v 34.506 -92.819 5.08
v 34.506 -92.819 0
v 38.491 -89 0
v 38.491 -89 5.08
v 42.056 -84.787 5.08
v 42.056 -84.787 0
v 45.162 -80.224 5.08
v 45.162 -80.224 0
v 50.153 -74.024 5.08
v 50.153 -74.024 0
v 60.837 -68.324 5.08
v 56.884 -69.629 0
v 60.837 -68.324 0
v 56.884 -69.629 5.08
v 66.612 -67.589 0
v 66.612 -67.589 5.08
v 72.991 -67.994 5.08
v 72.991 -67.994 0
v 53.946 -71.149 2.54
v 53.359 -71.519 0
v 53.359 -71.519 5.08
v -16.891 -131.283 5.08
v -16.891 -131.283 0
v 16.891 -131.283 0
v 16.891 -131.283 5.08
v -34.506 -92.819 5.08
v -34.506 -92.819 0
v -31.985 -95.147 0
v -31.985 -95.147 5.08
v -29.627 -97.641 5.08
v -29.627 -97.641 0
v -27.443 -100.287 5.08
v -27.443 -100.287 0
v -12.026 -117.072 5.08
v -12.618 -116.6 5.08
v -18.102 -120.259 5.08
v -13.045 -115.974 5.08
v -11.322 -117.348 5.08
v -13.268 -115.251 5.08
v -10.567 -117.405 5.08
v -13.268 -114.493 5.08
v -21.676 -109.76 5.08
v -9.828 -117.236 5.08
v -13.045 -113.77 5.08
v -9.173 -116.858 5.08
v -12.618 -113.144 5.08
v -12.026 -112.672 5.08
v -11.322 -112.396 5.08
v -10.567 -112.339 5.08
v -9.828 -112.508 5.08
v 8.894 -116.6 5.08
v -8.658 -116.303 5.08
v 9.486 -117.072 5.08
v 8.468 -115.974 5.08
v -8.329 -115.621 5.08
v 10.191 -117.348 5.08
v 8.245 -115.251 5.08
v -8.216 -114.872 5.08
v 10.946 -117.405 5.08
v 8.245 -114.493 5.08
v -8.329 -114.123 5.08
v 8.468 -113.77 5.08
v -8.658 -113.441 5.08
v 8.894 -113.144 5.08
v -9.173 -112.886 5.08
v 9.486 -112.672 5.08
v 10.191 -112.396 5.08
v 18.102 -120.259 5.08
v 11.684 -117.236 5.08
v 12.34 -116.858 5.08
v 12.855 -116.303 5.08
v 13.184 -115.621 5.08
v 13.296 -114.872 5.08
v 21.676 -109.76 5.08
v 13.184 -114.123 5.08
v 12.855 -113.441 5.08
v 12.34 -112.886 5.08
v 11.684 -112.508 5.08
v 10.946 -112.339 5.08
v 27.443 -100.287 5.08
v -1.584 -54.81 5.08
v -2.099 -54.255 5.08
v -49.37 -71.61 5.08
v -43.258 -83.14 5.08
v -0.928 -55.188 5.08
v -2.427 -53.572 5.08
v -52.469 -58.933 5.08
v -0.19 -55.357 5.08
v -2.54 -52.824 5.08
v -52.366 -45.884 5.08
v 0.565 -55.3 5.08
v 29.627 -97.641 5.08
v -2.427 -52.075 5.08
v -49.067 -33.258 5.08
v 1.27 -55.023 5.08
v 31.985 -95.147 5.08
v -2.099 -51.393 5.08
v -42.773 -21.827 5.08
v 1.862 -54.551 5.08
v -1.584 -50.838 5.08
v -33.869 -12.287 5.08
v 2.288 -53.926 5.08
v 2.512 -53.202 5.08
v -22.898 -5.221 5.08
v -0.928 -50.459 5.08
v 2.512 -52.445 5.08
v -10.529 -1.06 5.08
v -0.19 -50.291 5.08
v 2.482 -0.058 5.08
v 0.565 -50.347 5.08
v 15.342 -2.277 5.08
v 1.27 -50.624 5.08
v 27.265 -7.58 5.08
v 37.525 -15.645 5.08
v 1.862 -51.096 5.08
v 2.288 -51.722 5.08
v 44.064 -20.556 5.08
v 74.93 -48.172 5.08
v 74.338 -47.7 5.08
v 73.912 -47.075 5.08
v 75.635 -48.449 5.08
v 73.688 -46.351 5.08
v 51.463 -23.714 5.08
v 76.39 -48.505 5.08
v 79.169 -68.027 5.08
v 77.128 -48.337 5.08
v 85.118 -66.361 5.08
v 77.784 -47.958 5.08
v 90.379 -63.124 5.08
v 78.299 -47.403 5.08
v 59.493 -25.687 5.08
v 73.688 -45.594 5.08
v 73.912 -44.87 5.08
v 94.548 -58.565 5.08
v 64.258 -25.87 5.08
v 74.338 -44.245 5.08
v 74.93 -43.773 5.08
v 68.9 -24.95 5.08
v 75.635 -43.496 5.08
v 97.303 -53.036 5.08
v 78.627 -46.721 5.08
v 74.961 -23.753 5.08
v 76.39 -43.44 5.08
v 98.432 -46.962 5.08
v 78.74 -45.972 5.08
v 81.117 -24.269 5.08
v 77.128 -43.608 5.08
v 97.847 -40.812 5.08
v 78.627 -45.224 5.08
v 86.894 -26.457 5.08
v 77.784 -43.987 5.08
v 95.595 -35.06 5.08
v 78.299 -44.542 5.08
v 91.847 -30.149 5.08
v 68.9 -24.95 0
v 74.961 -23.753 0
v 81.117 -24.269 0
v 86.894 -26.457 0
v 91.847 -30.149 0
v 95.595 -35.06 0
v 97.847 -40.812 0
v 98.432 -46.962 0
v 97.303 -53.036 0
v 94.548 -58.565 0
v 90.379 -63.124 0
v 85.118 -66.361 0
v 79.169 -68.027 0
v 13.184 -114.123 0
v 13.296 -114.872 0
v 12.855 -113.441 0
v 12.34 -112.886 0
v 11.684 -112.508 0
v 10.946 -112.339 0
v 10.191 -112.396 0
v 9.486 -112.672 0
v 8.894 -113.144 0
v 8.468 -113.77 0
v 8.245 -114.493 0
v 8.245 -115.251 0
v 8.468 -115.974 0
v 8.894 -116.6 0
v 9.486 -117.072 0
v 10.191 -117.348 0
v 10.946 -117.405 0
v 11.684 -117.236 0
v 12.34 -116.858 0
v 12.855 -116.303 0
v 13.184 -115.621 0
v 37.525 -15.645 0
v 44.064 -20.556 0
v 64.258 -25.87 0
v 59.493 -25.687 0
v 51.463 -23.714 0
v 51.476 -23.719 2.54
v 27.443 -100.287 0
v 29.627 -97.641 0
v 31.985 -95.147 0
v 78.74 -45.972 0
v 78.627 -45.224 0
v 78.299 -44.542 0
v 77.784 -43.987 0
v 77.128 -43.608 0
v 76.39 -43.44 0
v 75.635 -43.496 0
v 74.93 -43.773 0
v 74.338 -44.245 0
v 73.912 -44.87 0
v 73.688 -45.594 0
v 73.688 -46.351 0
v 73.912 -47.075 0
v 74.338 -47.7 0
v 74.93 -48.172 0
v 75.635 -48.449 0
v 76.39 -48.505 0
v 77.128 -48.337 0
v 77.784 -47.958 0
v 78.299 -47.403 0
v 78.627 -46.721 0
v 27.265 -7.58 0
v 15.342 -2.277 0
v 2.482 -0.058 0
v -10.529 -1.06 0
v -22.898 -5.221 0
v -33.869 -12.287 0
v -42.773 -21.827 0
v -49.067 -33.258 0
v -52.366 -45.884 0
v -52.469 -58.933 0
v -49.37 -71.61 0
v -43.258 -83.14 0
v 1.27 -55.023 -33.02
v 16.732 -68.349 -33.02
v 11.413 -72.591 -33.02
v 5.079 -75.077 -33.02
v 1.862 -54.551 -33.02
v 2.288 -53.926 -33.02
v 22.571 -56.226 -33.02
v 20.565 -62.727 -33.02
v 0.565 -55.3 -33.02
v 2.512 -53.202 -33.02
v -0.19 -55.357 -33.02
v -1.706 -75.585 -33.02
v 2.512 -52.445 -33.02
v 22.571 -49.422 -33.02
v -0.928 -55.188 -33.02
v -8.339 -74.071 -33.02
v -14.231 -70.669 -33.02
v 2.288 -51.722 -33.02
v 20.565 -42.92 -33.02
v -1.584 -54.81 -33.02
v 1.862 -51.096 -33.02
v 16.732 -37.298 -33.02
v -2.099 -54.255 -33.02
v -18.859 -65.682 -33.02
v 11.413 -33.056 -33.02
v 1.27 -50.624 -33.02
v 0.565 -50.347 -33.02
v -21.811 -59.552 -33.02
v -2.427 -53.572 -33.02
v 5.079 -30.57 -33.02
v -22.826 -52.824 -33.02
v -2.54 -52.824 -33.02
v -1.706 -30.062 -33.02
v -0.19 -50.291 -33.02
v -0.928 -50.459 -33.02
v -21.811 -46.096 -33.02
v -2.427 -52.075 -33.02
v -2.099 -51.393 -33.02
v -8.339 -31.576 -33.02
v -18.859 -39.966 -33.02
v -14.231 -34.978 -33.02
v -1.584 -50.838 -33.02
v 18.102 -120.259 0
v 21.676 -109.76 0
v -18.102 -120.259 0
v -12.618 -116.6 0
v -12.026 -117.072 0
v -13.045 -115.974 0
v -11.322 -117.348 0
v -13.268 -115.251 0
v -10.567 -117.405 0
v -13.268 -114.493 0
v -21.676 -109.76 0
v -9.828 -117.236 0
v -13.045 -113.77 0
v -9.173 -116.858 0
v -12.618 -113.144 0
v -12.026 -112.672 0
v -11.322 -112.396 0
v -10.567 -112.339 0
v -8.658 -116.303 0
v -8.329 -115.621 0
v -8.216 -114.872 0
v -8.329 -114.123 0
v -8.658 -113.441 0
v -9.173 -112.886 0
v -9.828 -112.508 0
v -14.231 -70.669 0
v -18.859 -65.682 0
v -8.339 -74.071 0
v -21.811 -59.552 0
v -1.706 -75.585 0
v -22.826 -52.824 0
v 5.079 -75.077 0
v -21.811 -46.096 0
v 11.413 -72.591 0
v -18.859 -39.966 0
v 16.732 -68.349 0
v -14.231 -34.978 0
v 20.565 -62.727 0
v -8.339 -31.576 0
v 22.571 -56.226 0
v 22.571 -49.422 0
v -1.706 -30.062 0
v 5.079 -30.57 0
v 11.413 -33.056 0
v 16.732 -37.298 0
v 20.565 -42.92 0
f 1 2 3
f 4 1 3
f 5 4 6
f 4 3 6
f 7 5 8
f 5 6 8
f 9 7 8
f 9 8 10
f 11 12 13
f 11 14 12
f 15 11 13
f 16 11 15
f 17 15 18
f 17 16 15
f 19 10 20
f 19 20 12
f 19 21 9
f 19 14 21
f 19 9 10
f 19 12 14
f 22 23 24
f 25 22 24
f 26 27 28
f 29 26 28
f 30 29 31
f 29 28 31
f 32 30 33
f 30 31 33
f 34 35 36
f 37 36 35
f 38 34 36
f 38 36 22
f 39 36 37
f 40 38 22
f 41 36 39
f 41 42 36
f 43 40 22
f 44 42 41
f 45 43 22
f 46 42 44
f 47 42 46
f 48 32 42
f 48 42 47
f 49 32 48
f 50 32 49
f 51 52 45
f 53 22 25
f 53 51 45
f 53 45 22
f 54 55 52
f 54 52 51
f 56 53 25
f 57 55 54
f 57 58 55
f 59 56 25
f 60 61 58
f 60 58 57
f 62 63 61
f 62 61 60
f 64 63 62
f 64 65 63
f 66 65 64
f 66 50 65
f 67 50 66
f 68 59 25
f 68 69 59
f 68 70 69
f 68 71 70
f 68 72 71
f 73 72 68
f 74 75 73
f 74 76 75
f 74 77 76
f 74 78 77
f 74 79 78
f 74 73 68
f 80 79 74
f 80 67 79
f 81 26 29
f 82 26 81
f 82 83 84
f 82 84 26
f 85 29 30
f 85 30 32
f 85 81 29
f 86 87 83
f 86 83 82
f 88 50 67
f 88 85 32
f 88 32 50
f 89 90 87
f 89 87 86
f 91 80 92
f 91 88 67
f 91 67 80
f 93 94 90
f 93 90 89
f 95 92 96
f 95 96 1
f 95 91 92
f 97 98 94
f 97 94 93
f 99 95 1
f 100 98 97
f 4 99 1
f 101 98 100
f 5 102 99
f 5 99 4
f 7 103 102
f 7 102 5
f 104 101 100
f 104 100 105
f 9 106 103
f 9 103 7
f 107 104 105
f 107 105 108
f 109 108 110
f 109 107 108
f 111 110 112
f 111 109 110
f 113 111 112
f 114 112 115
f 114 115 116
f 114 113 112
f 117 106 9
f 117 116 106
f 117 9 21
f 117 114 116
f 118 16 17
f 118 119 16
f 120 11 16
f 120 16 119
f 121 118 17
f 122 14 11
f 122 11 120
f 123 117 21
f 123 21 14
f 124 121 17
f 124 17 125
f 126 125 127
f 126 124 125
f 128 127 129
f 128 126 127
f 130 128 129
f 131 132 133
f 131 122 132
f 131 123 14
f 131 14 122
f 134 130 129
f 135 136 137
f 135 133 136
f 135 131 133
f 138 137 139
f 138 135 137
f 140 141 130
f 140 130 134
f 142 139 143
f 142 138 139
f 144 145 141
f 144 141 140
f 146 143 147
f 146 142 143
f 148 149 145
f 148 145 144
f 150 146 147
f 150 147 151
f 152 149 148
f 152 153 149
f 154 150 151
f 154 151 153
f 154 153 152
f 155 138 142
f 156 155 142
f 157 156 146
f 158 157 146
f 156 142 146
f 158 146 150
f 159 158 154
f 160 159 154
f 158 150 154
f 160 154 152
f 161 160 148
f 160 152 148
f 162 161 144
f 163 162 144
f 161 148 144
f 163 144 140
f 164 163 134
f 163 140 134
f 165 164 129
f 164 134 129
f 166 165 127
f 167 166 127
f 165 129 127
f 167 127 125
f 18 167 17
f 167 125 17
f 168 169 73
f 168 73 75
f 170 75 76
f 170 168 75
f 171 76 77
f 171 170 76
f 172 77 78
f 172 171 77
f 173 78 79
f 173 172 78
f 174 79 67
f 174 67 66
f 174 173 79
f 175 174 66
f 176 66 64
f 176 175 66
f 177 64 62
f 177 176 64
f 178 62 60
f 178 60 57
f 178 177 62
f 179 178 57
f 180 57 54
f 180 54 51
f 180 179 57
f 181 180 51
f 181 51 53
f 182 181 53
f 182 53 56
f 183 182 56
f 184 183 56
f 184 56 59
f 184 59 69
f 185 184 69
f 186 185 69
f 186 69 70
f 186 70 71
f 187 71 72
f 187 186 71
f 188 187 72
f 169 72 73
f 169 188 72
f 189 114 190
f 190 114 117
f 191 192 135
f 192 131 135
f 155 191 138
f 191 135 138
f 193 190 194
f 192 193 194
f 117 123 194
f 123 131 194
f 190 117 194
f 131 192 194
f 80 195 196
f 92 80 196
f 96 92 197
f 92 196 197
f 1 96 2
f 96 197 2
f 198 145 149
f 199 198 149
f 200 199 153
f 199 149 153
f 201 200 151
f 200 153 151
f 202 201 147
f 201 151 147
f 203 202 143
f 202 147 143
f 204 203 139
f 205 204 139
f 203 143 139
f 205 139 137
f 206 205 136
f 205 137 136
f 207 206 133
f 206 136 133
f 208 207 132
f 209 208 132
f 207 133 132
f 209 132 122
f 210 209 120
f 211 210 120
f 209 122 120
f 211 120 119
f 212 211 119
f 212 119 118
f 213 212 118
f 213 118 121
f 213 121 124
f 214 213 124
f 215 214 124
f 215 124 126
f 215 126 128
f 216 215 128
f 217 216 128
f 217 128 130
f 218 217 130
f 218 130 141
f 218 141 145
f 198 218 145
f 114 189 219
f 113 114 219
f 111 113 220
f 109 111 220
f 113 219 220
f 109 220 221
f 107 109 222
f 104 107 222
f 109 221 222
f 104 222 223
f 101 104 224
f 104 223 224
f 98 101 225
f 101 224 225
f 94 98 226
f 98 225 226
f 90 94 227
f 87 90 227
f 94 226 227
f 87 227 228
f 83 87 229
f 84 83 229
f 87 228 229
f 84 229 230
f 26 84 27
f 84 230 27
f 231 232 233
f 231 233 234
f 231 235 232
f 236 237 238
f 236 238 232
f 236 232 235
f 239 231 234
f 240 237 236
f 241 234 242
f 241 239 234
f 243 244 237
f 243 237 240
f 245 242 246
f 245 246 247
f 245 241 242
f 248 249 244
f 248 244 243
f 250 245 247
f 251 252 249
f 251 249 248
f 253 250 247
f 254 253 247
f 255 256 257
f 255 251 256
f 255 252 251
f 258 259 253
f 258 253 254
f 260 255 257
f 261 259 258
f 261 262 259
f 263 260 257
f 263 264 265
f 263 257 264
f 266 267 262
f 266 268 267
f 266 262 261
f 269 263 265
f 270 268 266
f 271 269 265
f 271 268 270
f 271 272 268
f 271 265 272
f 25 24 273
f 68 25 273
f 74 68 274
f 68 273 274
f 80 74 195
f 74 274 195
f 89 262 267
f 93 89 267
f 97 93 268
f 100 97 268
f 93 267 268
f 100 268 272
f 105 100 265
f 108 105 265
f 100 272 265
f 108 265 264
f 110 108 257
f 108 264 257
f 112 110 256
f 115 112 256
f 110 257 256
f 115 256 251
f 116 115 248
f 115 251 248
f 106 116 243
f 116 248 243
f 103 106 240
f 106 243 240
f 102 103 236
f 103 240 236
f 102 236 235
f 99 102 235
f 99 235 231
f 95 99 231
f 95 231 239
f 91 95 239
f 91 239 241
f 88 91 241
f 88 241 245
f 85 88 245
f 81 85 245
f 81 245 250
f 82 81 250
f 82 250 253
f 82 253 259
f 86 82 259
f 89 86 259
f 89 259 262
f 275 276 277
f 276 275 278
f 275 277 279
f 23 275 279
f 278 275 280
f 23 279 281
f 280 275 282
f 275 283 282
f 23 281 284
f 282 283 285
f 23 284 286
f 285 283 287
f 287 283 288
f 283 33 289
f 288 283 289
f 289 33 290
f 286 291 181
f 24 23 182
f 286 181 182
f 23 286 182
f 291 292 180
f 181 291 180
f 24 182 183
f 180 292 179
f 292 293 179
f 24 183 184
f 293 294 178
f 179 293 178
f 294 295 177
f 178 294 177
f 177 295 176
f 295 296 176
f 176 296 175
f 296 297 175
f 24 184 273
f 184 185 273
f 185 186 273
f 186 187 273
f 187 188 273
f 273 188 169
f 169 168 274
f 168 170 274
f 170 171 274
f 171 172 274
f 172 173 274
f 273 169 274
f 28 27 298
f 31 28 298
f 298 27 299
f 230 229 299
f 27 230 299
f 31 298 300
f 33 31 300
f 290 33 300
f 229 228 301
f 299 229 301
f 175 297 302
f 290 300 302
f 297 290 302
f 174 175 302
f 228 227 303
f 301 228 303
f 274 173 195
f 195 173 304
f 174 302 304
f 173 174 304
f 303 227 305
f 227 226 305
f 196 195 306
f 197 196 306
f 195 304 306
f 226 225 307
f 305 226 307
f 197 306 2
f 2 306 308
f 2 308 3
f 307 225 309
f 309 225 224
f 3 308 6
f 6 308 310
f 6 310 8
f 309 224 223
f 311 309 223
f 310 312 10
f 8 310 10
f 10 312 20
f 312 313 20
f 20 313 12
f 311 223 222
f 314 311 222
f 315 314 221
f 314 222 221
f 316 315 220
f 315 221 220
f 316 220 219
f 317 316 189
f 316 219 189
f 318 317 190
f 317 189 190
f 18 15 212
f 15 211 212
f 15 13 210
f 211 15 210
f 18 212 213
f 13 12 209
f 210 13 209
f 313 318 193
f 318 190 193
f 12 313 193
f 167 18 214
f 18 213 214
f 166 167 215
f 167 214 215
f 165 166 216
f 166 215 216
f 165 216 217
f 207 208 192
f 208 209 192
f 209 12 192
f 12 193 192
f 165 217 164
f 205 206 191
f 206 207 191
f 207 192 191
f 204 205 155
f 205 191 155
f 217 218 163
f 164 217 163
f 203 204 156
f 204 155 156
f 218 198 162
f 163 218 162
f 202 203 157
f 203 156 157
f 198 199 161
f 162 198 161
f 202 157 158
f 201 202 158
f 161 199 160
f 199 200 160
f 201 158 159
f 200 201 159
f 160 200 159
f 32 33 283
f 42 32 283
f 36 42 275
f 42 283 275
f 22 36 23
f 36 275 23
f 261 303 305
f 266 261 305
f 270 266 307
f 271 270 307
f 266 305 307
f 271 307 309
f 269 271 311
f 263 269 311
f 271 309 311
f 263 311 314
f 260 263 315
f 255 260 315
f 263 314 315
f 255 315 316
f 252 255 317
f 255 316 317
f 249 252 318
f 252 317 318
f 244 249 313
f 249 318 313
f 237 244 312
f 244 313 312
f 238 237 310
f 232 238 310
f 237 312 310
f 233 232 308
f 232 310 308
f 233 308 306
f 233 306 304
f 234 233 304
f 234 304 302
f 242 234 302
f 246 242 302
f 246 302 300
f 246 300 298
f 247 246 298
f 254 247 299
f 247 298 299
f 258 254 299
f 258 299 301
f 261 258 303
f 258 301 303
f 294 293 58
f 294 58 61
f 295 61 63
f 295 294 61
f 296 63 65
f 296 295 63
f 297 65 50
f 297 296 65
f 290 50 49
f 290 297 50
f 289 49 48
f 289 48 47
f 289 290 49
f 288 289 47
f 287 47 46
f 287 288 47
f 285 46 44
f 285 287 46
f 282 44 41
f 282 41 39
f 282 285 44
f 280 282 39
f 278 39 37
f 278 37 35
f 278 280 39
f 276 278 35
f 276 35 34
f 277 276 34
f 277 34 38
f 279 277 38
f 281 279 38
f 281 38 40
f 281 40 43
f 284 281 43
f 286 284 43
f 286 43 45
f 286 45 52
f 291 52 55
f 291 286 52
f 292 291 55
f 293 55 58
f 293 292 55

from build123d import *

# Parameters (mm, degrees)
SKETCH1_R           = 2.54
BOSS_EXTRUDE1_DEPTH = 5.08
SKETCH2_R           = 22.825529453
BOSS_EXTRUDE2_DEPTH = 33.02
SKETCH3_R           = 2.54
CUT_EXTRUDE1_DEPTH  = 39.1
BOSS_EXTRUDE3_DEPTH = 5.08
SKETCH5_R           = 2.54
CUT_EXTRUDE2_DEPTH  = 39.1


with BuildPart() as part:
    # Sketch1 → Boss-Extrude1 (new body)
    with BuildSketch(Plane.XY):
        with BuildLine():
            Line((-16.891, -131.282672274), (16.891, -131.282672274))
            ThreePointArc((16.891, -131.282672274), (19.601252021, -114.911473805), (27.442816508, -100.287128633))
            ThreePointArc((27.442816508, -100.287128633), (30.785280347, -96.37410804), (34.5064888, -92.819336271))
            ThreePointArc((34.5064888, -92.819336271), (0, 0), (-34.5064888, -92.819336271))
            ThreePointArc((-34.5064888, -92.819336271), (-30.785280347, -96.37410804), (-27.442816508, -100.287128633))
            ThreePointArc((-27.442816508, -100.287128633), (-19.601252021, -114.911473805), (-16.891, -131.282672274))
        make_face()
        with Locations((-10.756405179, -114.872047193)):
            Circle(SKETCH1_R, mode=Mode.SUBTRACT)
        with Locations((10.756405179, -114.872047193)):
            Circle(SKETCH1_R, mode=Mode.SUBTRACT)
    extrude(amount=BOSS_EXTRUDE1_DEPTH)

    # Sketch2 → Boss-Extrude2 (add)
    with BuildSketch(Plane(origin=(0, 0, 0), x_dir=(-1, 0, 0), z_dir=(0, 0, -1))):
        with Locations((0, -52.823729134)):
            Circle(SKETCH2_R)
    extrude(amount=BOSS_EXTRUDE2_DEPTH)

    # Sketch3 → Cut-Extrude1 (cut, through all)
    with BuildSketch(Plane(origin=(0, 0, -33.02), x_dir=(-1, 0, 0), z_dir=(0, 0, -1))):
        with Locations((0, -52.823729134)):
            Circle(SKETCH3_R)
    extrude(amount=-CUT_EXTRUDE1_DEPTH, mode=Mode.SUBTRACT)

    # Sketch4 → Boss-Extrude3 (add)
    with BuildSketch(Plane.XY.offset(5.08)):
        with BuildLine():
            ThreePointArc((45.161811227, -80.223677424), (52.45816234, -46.619894549), (37.524583334, -15.645079276))
            add(Edge.make_bspline(
                [(37.524583334, -15.645079276), (41.569282444, -19.727412804), (51.389708048, -24.415182371), (63.297197231, -26.895437115), (68.900180003, -24.949874899)],
                knots=[0, 0, 0, 0, 0.479929933, 1, 1, 1, 1], degree=3))
            ThreePointArc((68.900180003, -24.949874899), (98.354072, -43.866775297), (72.9914133, -67.993864183))
            add(Edge.make_bspline(
                [(45.161811227, -80.223677424), (47.574313167, -76.247284621), (55.033388576, -68.640688731), (65.508215076, -66.903538588), (72.9914133, -67.993864183)],
                knots=[0, 0, 0, 0, 0.395495141, 1, 1, 1, 1], degree=3))
        make_face()
    extrude(amount=-BOSS_EXTRUDE3_DEPTH)

    # Sketch5 → Cut-Extrude2 (cut, through all)
    with BuildSketch(Plane.XY.offset(5.08)):
        with Locations((76.2, -45.972469461)):
            Circle(SKETCH5_R)
    extrude(amount=-CUT_EXTRUDE2_DEPTH, mode=Mode.SUBTRACT)


solid = part.part
